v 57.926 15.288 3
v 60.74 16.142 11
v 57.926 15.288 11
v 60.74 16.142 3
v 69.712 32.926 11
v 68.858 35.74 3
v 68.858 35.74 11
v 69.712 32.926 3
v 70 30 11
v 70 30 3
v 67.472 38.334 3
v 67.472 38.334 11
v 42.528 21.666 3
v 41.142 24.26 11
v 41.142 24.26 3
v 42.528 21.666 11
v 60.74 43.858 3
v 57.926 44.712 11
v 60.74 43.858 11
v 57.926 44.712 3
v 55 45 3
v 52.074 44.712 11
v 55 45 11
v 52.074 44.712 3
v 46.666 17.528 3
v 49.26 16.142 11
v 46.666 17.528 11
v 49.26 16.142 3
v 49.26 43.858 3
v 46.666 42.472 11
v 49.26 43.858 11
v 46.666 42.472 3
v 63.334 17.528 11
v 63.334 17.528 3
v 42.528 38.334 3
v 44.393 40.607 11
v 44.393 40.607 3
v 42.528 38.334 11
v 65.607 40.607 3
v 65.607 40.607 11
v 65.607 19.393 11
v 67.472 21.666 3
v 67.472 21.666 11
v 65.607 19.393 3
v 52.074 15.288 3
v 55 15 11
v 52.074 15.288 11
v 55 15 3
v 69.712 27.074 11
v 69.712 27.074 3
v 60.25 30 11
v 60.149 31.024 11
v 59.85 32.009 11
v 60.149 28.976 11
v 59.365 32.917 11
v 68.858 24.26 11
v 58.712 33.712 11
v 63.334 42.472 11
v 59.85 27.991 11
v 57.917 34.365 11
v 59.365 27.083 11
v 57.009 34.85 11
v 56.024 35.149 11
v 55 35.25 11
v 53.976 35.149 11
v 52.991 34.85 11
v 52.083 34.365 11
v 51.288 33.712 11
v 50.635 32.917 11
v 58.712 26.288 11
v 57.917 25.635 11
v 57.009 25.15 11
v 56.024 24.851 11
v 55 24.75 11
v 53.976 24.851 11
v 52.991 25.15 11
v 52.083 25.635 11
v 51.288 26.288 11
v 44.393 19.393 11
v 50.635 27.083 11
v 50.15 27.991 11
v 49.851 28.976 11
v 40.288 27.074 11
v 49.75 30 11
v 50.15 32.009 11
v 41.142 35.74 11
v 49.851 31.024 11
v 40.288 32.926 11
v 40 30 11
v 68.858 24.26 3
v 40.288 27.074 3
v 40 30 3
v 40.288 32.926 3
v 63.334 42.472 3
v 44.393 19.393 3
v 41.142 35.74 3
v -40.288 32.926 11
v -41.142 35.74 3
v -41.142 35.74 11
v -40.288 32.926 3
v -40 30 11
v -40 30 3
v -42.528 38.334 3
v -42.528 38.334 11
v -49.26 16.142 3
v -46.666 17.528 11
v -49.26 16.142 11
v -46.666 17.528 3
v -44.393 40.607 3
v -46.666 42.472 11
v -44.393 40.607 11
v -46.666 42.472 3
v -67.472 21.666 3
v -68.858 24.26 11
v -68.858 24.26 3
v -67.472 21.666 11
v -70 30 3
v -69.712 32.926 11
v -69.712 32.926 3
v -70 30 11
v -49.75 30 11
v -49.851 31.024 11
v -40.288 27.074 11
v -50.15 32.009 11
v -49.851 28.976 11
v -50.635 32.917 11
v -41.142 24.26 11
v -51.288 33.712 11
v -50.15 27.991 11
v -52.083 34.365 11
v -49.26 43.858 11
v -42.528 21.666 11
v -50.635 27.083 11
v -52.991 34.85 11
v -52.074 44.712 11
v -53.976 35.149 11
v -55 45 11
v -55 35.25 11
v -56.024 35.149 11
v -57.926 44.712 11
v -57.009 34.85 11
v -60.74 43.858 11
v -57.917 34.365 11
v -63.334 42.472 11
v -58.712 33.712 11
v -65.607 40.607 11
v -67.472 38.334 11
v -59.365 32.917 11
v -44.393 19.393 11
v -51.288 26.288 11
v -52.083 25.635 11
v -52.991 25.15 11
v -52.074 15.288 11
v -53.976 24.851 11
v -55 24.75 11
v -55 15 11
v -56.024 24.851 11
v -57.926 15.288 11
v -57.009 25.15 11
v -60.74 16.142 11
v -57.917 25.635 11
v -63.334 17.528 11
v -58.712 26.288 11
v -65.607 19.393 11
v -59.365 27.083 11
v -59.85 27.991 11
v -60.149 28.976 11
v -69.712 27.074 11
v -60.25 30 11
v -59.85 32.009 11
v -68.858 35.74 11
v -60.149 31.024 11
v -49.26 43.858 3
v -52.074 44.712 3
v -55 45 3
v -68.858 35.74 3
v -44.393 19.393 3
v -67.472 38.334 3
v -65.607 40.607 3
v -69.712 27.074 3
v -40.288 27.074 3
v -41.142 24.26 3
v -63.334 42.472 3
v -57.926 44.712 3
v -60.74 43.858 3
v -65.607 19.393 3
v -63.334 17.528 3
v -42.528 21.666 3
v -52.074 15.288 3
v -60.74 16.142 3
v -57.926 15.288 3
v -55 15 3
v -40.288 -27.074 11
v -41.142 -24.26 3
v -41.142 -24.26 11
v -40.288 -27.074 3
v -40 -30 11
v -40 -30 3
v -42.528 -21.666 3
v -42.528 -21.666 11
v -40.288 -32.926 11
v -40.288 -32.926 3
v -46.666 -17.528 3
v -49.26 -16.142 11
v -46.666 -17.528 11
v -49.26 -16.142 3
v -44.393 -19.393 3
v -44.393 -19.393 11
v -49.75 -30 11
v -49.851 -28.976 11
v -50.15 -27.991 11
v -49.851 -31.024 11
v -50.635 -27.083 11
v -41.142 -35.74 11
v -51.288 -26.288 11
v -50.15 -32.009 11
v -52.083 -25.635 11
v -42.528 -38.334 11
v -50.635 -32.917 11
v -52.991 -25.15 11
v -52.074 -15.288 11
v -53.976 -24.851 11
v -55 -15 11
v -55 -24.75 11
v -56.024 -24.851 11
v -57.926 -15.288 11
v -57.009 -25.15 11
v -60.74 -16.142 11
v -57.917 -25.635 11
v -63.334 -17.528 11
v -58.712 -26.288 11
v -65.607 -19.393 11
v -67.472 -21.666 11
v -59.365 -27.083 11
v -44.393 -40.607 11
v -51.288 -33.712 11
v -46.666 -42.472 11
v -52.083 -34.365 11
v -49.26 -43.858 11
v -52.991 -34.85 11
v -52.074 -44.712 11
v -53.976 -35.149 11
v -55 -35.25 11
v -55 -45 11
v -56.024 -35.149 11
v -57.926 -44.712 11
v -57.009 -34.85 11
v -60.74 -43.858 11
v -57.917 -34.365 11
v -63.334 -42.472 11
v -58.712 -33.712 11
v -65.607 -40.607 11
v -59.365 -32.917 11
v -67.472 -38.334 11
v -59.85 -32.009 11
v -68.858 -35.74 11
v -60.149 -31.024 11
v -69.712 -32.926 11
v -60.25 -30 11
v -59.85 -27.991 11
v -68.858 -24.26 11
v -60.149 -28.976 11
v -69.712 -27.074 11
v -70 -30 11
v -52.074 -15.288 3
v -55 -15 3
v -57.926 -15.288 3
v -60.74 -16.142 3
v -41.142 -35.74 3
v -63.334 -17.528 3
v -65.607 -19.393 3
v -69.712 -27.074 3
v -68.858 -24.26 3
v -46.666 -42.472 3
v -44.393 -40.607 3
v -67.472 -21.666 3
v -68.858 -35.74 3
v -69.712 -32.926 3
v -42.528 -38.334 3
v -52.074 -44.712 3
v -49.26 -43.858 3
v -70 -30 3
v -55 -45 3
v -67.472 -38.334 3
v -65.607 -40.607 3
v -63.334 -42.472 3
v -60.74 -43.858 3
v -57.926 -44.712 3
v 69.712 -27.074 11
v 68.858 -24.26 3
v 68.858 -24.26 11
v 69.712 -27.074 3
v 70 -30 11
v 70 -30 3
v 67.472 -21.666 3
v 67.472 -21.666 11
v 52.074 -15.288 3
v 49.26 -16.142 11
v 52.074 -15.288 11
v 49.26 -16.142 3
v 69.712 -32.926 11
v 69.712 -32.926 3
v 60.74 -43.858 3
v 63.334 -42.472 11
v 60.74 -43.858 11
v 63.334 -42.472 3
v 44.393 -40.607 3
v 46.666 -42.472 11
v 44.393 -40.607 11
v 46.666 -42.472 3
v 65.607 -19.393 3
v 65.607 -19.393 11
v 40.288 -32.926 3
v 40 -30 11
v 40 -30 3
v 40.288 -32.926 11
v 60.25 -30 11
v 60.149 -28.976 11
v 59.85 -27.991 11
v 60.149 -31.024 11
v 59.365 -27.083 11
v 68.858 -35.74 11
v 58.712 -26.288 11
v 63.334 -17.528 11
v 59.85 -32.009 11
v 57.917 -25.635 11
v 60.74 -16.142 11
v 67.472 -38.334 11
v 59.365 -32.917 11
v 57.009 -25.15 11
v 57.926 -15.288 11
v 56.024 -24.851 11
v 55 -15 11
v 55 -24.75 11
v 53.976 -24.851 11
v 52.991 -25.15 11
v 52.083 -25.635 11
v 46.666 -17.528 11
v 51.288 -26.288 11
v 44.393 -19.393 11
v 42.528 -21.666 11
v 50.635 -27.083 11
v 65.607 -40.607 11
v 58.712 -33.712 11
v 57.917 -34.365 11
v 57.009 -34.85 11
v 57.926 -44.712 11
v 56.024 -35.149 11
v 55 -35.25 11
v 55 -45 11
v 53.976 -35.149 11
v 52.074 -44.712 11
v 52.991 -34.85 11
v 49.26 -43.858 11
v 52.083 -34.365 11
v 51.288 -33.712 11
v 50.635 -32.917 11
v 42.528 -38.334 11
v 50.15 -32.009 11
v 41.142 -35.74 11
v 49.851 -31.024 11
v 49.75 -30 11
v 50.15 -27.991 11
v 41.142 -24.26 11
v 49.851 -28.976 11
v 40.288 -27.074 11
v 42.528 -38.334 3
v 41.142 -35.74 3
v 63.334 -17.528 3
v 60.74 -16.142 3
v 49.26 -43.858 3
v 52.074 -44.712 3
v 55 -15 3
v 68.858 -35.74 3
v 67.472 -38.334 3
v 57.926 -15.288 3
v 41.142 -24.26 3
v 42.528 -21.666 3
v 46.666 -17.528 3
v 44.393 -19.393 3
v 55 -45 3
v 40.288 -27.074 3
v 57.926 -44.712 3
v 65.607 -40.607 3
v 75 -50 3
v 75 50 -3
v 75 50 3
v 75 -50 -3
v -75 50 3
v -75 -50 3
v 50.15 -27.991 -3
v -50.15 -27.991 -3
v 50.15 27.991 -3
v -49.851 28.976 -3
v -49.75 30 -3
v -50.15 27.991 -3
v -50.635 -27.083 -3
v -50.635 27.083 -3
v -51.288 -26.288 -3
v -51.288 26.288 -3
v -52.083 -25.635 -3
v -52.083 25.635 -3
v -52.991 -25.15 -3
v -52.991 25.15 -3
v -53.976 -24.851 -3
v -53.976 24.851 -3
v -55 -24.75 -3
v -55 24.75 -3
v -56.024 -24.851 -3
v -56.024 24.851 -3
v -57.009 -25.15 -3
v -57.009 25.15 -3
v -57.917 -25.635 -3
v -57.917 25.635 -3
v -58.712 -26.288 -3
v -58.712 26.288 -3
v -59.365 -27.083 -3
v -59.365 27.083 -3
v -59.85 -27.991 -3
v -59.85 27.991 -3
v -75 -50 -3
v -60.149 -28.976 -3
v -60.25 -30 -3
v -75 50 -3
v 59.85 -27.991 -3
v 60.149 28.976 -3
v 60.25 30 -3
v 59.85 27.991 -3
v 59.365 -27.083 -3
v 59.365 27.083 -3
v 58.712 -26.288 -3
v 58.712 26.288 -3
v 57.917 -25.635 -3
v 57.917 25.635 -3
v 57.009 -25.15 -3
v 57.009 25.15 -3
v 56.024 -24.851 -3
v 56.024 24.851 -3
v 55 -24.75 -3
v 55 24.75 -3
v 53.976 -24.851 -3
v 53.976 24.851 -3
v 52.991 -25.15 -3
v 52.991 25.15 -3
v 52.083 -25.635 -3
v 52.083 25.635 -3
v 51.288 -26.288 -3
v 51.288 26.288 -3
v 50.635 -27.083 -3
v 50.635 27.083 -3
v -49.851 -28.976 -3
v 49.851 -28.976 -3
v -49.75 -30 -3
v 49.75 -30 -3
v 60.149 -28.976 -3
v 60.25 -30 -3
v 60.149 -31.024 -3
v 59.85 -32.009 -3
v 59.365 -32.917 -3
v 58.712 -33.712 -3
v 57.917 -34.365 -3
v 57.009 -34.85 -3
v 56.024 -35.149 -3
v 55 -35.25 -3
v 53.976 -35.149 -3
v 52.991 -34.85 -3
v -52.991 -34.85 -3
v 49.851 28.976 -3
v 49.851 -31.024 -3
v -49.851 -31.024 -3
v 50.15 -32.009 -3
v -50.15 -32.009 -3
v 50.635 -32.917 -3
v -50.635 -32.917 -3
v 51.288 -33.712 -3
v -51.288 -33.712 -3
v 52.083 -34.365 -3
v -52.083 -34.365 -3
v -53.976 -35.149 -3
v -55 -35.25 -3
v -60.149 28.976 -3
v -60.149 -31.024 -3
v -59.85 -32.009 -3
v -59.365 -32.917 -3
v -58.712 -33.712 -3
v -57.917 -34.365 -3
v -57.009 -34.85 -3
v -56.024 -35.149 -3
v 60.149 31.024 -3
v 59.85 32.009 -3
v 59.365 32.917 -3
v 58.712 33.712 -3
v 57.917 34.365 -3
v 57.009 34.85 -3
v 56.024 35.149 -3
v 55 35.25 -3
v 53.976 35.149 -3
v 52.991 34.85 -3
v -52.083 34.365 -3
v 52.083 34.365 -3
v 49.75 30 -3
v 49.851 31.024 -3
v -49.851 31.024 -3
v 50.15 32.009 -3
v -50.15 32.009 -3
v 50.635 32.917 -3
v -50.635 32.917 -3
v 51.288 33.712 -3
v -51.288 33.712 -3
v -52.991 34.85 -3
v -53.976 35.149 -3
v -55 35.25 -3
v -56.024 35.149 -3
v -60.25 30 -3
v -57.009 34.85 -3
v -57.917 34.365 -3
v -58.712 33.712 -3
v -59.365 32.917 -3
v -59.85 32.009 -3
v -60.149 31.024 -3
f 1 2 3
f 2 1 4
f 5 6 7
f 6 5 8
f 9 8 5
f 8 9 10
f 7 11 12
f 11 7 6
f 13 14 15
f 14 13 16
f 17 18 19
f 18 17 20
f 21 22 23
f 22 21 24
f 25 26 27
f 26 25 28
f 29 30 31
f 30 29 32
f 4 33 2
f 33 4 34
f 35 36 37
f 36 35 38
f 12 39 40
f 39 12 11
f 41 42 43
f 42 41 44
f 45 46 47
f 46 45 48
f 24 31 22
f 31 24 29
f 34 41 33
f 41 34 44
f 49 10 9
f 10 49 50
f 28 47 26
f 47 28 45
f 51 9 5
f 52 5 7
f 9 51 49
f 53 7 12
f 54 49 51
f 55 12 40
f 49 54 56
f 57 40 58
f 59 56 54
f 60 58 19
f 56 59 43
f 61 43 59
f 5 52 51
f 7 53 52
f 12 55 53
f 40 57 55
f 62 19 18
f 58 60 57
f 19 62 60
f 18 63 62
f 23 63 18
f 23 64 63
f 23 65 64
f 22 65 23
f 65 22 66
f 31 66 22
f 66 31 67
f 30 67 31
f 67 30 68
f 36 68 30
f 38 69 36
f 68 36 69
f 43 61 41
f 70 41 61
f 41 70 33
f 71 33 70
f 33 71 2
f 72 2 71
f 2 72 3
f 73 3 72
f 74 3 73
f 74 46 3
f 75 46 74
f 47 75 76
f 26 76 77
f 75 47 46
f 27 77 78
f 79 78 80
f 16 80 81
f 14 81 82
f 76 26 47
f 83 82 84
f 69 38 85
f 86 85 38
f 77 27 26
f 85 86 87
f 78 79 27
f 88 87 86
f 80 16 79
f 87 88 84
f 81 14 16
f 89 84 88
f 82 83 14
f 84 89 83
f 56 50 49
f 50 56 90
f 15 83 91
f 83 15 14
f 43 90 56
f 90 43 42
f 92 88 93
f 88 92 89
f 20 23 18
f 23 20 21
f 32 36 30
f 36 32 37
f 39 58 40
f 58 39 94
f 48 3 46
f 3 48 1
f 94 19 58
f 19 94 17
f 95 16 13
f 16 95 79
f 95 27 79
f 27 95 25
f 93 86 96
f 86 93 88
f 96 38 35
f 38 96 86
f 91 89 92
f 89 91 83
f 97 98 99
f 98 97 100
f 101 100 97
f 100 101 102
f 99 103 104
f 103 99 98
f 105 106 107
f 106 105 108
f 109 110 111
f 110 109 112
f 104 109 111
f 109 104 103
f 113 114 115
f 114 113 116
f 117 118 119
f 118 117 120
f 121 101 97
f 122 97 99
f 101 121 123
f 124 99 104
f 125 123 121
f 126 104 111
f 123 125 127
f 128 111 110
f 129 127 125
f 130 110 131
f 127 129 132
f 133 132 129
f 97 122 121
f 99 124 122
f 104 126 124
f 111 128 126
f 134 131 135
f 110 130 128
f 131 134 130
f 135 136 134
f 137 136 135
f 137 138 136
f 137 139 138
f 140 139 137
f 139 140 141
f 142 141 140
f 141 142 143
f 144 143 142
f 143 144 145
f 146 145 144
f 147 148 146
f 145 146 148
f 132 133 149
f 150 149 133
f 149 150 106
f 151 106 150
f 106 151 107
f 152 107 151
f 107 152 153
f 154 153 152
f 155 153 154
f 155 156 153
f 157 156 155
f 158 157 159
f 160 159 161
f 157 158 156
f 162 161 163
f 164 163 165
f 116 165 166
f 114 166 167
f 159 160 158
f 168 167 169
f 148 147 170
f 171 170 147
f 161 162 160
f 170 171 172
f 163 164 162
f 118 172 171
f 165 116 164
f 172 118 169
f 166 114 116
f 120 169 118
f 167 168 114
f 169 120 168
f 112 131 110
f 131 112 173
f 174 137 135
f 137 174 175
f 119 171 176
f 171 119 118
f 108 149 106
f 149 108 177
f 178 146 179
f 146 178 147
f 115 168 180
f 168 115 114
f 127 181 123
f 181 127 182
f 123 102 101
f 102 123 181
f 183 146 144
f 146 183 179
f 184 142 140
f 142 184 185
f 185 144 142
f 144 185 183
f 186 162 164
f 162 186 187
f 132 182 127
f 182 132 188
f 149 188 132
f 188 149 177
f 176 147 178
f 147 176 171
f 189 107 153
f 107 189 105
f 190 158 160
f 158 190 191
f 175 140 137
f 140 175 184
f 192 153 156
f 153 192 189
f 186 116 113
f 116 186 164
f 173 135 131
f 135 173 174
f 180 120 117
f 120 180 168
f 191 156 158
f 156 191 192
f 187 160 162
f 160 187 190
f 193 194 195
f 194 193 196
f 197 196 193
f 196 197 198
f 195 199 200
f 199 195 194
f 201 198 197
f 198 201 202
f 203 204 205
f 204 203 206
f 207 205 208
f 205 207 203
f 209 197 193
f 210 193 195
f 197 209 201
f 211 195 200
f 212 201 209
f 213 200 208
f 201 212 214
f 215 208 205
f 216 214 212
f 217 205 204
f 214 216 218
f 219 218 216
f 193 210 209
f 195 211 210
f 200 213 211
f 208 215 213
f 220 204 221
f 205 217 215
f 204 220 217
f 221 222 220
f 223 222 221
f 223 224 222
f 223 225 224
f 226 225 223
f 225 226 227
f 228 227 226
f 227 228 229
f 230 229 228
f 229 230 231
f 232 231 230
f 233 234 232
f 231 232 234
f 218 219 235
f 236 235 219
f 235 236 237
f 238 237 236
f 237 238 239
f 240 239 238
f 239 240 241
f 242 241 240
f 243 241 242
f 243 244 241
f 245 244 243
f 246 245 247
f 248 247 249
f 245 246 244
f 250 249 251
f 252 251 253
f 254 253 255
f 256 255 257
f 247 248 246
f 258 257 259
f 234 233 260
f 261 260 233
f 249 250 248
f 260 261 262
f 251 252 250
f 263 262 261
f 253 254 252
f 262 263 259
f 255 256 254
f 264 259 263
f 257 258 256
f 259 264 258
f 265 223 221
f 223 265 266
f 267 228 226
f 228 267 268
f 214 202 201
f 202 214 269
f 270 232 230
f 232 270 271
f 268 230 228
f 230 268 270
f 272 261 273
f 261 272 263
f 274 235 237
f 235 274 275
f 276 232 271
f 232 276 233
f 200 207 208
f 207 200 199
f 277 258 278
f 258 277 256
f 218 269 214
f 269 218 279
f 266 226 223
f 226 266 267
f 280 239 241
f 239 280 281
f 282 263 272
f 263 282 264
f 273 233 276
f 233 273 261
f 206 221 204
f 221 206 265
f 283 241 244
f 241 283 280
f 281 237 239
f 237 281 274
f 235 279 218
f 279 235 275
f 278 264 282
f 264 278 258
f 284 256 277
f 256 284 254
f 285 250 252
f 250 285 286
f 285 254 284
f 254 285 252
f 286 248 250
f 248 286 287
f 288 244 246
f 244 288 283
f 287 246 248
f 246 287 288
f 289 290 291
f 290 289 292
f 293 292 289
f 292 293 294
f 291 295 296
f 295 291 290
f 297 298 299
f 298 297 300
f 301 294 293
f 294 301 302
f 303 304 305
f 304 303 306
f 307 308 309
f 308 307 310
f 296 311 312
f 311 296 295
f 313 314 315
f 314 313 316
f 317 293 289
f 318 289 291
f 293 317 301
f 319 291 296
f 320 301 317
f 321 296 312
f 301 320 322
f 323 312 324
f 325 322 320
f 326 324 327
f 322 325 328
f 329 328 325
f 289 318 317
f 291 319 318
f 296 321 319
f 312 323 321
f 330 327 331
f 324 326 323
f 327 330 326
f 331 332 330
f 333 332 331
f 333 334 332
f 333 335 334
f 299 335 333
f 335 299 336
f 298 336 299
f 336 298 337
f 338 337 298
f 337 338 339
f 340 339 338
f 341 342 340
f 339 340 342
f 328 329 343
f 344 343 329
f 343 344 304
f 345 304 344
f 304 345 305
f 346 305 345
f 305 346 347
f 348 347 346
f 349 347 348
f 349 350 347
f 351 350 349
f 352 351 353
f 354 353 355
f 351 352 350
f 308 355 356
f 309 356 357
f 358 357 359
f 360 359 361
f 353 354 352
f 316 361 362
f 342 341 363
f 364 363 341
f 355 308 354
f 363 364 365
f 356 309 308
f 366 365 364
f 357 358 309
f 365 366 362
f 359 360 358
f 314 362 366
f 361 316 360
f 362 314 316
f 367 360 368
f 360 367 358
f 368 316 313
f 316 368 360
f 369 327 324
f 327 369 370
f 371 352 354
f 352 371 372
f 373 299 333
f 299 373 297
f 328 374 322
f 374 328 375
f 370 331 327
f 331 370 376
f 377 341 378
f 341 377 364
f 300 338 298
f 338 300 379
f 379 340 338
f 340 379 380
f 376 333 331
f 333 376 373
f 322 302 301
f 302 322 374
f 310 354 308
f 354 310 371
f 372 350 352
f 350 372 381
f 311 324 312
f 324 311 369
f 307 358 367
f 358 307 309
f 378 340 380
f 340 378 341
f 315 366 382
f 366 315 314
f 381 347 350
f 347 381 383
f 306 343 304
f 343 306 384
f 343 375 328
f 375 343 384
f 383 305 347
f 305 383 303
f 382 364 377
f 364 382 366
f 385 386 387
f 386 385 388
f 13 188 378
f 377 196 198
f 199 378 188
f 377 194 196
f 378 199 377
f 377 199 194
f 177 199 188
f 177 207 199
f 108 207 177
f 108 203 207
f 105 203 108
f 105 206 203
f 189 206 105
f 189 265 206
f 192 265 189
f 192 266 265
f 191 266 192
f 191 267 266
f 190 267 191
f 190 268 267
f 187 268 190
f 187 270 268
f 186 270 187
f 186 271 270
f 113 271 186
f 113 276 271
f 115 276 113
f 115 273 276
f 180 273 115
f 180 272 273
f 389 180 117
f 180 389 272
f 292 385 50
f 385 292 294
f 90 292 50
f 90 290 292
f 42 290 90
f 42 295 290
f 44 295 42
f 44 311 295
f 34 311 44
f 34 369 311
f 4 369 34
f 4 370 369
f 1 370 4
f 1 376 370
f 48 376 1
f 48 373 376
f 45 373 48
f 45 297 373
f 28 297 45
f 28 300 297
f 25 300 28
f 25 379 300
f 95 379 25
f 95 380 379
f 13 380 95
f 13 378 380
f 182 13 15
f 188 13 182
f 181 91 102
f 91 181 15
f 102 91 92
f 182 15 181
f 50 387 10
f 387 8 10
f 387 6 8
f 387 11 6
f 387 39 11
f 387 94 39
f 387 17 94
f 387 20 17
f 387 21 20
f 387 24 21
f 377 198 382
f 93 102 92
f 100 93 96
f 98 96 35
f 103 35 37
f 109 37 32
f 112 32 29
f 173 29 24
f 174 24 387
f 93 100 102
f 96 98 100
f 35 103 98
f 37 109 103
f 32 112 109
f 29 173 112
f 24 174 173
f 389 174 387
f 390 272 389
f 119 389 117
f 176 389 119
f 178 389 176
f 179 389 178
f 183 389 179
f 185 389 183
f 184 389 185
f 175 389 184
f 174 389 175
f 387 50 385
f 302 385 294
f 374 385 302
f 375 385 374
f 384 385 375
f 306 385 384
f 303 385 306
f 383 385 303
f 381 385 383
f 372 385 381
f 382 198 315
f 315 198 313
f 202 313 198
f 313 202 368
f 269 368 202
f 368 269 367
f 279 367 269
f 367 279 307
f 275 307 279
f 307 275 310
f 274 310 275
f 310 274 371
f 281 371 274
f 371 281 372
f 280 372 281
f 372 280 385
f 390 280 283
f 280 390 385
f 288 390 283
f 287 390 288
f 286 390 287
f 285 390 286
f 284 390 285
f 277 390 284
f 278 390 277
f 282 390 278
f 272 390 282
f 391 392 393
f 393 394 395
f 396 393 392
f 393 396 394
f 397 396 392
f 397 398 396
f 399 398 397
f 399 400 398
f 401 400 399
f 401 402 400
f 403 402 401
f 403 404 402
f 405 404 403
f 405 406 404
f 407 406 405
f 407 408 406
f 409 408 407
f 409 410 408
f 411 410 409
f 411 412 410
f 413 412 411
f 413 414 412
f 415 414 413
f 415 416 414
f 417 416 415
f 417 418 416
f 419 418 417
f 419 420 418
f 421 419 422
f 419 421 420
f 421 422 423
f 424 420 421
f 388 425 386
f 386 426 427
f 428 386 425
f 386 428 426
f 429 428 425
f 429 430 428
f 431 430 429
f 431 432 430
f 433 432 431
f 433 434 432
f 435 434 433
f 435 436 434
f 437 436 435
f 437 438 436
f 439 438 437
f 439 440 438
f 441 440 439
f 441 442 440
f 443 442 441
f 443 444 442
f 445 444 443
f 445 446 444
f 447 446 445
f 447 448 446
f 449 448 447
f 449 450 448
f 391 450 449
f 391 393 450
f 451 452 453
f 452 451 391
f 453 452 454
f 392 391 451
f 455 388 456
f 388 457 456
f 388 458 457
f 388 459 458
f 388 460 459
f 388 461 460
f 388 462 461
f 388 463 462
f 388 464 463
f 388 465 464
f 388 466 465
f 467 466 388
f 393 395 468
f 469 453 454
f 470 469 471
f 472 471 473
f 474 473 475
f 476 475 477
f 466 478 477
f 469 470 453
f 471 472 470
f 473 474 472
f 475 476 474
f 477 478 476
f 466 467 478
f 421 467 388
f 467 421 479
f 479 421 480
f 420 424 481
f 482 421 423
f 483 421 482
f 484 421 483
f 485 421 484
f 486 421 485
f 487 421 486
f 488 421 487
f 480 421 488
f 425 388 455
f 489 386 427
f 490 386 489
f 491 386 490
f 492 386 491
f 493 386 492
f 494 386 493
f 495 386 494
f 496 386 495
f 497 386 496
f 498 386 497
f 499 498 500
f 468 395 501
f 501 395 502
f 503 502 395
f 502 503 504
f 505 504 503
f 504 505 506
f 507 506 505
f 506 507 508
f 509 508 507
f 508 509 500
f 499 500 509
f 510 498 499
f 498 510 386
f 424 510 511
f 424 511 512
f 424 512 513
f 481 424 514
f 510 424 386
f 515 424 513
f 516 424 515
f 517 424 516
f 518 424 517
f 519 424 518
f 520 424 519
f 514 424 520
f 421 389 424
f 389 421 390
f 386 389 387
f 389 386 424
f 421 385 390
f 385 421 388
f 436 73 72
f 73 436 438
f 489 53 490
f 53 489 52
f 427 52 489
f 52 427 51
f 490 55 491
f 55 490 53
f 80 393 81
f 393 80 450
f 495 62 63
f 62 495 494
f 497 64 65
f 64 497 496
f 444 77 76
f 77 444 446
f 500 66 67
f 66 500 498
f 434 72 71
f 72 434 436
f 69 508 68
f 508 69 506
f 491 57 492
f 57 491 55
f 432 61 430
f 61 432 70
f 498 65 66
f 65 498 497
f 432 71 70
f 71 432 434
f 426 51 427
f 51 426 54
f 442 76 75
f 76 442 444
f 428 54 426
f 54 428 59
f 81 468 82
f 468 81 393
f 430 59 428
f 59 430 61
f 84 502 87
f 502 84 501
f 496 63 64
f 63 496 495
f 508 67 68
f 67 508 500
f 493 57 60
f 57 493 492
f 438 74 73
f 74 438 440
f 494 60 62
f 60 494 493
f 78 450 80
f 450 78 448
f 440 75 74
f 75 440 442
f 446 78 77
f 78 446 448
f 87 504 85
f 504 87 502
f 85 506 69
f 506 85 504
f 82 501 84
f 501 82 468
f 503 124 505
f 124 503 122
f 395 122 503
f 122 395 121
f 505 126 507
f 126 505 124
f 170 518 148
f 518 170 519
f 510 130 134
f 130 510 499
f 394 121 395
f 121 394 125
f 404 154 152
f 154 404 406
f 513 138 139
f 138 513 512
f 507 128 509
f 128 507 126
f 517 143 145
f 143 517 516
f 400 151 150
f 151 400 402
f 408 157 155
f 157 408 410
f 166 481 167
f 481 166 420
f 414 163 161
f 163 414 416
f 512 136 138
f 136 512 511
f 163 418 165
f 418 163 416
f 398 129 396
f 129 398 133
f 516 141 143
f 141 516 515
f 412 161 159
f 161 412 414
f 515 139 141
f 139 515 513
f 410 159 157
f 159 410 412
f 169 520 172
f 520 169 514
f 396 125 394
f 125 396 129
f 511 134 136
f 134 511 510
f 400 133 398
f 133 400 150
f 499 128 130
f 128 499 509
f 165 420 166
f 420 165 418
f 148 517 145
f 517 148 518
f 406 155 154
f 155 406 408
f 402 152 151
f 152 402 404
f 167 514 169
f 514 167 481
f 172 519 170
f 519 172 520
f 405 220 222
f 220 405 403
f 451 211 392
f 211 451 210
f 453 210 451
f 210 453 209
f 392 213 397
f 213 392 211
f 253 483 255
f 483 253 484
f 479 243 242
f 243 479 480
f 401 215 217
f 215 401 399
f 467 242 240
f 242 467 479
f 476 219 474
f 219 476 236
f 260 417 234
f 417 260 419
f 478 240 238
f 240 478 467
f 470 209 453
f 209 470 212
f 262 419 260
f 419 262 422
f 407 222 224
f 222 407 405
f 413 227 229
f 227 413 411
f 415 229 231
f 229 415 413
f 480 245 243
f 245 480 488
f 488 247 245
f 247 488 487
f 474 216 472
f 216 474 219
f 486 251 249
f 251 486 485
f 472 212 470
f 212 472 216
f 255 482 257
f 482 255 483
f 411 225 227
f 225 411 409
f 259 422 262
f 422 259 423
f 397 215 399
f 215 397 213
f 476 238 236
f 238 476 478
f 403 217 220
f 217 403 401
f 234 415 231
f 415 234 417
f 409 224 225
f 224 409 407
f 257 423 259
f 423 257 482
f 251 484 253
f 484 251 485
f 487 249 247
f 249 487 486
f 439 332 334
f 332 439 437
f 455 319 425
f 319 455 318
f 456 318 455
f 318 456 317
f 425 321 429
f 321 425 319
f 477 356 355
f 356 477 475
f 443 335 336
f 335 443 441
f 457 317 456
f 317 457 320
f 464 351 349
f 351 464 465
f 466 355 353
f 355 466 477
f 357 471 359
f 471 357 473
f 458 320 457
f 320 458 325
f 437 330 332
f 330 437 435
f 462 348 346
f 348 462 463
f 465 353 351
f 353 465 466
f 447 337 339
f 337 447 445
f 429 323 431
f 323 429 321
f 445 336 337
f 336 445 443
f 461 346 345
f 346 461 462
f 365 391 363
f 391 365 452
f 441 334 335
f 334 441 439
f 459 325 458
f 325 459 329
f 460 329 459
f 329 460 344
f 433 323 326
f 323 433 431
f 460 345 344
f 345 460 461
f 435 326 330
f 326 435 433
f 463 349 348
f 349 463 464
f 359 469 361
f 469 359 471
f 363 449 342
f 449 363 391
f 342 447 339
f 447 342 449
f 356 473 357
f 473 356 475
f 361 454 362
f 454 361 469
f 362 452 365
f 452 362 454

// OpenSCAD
$fn = 32;

// ----------------------------------------------------------------------
// Anchor pads 150 x 100 x 14
// four corner bosses with anchor holes
// ----------------------------------------------------------------------

// --- parameters (mm) ---
plate = [150, 100, 6];  // base plate size (x, y, z)
pads = 4;               // boss count, one per corner
edge = 20;              // boss centre offset from the plate edge
boss_d = 30;            // boss diameter
boss_h = 8;             // boss height above the base plate
hole_d = 10.5;          // hole diameter

// --- derived feature positions (mm) ---
height = plate[2] + boss_h;      // = 14   overall height of the part
corner_x = plate[0] / 2 - edge;  // = 55   boss centre X
corner_y = plate[1] / 2 - edge;  // = 30   boss centre Y
feature_centers = [
  [corner_x, corner_y],
  [-corner_x, corner_y],
  [-corner_x, -corner_y],
  [corner_x, -corner_y]
];   // boss centres, anchor holes are drilled there

// base plate, four bosses standing on it, anchor holes all the way through
difference() {
  union() {
    cube(plate, center = true);
    for (centre = feature_centers)
      translate([centre[0], centre[1], plate[2] / 2 - 1])
        cylinder(d = boss_d, h = boss_h + 1);
  }
  for (centre = feature_centers)
    translate([centre[0], centre[1], -height])
      cylinder(d = hole_d, h = 2 * height + 2);  // through boss and plate
}
